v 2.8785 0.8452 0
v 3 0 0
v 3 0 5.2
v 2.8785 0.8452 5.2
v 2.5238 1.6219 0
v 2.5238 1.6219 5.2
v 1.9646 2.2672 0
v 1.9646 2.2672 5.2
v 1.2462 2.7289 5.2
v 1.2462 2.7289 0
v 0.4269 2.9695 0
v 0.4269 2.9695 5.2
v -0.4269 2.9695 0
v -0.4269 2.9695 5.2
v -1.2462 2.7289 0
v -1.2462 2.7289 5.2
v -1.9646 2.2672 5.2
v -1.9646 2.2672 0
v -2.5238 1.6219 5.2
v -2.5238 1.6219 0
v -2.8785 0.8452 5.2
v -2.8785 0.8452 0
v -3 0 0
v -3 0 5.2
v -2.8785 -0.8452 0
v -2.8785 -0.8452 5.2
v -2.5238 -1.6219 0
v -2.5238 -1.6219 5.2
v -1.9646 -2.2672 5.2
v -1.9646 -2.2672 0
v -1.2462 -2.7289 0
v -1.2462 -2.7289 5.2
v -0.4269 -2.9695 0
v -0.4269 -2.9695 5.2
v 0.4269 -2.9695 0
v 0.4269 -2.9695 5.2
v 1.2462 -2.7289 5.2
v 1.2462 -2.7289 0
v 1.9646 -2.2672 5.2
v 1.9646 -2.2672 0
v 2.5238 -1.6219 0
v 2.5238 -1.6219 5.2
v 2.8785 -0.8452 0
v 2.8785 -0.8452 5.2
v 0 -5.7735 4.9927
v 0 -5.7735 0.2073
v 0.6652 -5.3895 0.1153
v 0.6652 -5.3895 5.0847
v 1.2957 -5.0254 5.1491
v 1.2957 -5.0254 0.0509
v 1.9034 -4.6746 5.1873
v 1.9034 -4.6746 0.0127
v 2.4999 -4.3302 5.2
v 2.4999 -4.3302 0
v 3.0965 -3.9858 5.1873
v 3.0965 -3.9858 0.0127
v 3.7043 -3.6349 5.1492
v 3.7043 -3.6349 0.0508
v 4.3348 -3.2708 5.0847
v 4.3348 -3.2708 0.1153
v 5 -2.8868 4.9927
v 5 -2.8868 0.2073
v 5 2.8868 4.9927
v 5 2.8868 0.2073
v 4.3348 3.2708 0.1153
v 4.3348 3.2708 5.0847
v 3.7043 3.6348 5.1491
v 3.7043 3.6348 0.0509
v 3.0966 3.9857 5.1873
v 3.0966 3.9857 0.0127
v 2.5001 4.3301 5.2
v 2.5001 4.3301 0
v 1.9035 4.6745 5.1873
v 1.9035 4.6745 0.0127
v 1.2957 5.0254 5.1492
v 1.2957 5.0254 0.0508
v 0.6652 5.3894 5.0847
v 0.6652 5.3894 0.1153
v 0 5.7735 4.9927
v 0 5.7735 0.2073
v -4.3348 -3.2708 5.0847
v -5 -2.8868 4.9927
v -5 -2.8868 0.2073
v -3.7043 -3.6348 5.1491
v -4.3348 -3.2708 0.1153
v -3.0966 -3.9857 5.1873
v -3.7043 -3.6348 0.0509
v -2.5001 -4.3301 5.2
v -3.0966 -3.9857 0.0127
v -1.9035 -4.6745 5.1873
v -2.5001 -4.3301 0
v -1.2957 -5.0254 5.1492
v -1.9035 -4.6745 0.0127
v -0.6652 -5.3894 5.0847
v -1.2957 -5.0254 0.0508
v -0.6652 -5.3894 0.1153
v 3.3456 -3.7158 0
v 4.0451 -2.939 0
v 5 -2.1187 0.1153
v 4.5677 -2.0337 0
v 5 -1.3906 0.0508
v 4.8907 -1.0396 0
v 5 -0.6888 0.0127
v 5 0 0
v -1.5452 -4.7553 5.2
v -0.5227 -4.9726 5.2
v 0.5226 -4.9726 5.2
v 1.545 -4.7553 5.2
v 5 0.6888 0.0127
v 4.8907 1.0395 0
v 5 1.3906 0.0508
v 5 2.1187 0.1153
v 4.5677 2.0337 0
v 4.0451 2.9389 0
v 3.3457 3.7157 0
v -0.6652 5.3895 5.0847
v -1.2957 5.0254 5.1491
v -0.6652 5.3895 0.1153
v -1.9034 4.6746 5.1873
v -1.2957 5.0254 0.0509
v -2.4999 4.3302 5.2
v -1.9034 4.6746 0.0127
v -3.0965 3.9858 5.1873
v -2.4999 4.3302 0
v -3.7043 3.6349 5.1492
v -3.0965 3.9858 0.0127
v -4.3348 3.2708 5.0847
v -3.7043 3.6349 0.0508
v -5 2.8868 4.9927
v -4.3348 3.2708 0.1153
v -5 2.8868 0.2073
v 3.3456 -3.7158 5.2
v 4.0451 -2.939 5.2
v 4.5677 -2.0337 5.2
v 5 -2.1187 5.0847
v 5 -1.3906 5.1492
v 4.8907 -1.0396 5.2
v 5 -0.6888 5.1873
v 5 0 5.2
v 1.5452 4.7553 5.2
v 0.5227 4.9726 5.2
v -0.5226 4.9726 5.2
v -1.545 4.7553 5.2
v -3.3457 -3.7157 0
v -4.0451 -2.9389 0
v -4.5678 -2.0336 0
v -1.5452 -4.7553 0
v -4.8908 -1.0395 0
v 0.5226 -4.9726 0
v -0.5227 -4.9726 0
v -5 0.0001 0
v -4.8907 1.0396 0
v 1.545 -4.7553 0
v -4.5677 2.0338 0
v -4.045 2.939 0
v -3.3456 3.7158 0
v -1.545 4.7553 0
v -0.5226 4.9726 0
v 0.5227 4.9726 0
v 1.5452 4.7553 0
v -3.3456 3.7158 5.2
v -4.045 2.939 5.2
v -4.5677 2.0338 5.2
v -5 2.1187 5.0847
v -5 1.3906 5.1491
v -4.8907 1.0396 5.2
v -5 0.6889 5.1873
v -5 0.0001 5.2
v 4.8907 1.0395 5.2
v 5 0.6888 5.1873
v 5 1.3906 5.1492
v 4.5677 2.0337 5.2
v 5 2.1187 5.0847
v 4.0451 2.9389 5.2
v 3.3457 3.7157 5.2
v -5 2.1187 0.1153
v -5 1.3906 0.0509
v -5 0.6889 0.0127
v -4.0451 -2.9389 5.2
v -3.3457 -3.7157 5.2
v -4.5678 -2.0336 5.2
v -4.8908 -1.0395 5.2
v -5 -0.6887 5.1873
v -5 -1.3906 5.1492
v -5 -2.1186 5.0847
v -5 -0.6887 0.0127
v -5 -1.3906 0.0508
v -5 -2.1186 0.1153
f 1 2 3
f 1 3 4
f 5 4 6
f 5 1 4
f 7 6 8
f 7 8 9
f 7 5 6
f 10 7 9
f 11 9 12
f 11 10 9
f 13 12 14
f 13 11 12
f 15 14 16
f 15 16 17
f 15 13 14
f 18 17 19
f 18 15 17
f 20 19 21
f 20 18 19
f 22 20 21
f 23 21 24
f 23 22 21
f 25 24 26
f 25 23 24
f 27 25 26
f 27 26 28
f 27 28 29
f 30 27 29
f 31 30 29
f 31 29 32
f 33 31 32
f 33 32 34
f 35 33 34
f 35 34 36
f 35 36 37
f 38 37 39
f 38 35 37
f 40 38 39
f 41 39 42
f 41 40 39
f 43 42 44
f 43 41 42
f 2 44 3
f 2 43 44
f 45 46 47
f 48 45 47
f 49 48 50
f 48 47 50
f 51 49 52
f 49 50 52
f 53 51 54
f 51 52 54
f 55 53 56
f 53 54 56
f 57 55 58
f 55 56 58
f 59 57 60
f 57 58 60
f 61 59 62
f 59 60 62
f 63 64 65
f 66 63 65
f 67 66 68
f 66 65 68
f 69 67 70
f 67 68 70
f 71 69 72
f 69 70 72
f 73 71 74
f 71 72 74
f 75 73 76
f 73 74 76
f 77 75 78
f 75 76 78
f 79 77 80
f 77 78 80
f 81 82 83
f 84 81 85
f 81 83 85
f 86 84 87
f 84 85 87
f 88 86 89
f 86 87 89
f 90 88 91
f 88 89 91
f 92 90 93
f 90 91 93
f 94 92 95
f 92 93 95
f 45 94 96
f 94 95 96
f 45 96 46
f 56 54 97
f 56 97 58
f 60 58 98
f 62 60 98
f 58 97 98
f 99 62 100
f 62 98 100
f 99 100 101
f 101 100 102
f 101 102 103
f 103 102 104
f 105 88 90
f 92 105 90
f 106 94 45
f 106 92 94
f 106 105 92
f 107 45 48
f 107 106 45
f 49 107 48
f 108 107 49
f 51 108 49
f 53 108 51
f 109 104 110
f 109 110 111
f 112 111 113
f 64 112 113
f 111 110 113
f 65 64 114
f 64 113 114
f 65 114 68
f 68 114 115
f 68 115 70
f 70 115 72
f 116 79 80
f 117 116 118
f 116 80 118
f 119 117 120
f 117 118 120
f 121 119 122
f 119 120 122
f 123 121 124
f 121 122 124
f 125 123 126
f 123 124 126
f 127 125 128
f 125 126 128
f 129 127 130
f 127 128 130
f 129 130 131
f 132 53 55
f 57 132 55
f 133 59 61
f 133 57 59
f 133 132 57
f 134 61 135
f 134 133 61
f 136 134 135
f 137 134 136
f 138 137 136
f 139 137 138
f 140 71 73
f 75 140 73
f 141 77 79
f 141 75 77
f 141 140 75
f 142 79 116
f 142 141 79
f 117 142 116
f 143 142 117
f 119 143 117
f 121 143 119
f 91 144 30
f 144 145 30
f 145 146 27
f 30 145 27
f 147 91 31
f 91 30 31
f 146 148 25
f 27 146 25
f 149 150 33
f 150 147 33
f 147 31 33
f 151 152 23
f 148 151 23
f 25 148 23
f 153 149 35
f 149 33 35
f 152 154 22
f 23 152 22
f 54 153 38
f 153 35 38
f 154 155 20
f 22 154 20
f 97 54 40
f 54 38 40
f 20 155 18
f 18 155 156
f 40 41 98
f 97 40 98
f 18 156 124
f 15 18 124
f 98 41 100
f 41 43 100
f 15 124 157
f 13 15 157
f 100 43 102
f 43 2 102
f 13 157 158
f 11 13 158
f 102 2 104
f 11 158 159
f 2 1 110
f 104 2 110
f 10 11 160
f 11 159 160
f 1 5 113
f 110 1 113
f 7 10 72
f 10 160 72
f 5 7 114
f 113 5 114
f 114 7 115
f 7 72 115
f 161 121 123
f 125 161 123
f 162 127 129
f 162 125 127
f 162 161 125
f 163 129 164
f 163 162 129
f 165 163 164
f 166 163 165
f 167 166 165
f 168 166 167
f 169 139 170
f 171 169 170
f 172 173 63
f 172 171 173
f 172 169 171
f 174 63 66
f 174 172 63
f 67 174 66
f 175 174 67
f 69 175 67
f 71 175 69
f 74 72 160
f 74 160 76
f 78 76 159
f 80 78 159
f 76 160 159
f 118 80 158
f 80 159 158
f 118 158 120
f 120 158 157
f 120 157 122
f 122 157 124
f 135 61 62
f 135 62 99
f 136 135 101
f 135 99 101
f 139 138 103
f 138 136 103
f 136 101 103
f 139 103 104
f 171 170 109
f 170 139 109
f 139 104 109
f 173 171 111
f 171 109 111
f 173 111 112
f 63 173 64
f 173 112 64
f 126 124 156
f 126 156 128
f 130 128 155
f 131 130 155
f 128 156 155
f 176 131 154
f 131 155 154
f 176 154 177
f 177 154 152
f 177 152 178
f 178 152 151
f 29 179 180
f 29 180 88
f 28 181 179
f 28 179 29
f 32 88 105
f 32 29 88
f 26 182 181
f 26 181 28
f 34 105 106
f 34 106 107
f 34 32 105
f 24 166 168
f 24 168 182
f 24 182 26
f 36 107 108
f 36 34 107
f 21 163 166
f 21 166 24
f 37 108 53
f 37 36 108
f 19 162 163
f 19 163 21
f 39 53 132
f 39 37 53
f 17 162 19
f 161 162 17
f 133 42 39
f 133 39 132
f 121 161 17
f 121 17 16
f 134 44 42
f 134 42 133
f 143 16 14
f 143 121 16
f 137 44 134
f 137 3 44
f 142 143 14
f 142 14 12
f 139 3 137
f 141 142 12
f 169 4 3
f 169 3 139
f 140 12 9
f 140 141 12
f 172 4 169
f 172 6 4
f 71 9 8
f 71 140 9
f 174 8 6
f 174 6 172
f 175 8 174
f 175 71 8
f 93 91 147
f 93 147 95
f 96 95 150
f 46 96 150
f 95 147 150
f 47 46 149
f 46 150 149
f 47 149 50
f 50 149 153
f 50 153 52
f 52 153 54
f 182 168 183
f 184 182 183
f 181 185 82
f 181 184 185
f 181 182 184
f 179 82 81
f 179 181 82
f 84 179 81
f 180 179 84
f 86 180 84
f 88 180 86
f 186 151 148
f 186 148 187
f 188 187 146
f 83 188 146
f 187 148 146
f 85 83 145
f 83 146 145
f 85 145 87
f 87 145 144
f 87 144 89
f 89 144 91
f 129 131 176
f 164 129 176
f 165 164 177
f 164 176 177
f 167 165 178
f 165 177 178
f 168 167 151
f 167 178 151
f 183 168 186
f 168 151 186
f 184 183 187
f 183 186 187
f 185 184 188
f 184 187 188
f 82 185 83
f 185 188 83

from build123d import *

# Parameters (mm, degrees)
SKETCH1_R           = 3
BOSS_EXTRUDE1_DEPTH = 5.2


with BuildPart() as part:
    # Sketch1 → Boss-Extrude1 (new body)
    with BuildSketch(Plane.XY):
        Polygon((0, 5.773502692), (-5, 2.886751346), (-5, -2.886751346), (0, -5.773502692), (5, -2.886751346), (5, 2.886751346), align=None)
        Circle(SKETCH1_R, mode=Mode.SUBTRACT)
    extrude(amount=BOSS_EXTRUDE1_DEPTH)

    # Sketch2 → Cut-Revolve2 (revolve, cut)
    with BuildSketch(Plane(origin=(0, 0, 0), x_dir=(0, 0, -1), z_dir=(0, 1, 0))):
        Polygon((-4.396152423, -8), (-6.405771366, -0.5), (-6.405771366, -8), align=None)
    cut_revolve2 = revolve(axis=Axis((0, 0, -2.80878951), (0, 0, 1)), mode=Mode.SUBTRACT)

    # Mirror1: Cut-Revolve2 across plane
    add(cut_revolve2.mirror(Plane.XY.offset(2.6)), mode=Mode.SUBTRACT)


solid = part.part
